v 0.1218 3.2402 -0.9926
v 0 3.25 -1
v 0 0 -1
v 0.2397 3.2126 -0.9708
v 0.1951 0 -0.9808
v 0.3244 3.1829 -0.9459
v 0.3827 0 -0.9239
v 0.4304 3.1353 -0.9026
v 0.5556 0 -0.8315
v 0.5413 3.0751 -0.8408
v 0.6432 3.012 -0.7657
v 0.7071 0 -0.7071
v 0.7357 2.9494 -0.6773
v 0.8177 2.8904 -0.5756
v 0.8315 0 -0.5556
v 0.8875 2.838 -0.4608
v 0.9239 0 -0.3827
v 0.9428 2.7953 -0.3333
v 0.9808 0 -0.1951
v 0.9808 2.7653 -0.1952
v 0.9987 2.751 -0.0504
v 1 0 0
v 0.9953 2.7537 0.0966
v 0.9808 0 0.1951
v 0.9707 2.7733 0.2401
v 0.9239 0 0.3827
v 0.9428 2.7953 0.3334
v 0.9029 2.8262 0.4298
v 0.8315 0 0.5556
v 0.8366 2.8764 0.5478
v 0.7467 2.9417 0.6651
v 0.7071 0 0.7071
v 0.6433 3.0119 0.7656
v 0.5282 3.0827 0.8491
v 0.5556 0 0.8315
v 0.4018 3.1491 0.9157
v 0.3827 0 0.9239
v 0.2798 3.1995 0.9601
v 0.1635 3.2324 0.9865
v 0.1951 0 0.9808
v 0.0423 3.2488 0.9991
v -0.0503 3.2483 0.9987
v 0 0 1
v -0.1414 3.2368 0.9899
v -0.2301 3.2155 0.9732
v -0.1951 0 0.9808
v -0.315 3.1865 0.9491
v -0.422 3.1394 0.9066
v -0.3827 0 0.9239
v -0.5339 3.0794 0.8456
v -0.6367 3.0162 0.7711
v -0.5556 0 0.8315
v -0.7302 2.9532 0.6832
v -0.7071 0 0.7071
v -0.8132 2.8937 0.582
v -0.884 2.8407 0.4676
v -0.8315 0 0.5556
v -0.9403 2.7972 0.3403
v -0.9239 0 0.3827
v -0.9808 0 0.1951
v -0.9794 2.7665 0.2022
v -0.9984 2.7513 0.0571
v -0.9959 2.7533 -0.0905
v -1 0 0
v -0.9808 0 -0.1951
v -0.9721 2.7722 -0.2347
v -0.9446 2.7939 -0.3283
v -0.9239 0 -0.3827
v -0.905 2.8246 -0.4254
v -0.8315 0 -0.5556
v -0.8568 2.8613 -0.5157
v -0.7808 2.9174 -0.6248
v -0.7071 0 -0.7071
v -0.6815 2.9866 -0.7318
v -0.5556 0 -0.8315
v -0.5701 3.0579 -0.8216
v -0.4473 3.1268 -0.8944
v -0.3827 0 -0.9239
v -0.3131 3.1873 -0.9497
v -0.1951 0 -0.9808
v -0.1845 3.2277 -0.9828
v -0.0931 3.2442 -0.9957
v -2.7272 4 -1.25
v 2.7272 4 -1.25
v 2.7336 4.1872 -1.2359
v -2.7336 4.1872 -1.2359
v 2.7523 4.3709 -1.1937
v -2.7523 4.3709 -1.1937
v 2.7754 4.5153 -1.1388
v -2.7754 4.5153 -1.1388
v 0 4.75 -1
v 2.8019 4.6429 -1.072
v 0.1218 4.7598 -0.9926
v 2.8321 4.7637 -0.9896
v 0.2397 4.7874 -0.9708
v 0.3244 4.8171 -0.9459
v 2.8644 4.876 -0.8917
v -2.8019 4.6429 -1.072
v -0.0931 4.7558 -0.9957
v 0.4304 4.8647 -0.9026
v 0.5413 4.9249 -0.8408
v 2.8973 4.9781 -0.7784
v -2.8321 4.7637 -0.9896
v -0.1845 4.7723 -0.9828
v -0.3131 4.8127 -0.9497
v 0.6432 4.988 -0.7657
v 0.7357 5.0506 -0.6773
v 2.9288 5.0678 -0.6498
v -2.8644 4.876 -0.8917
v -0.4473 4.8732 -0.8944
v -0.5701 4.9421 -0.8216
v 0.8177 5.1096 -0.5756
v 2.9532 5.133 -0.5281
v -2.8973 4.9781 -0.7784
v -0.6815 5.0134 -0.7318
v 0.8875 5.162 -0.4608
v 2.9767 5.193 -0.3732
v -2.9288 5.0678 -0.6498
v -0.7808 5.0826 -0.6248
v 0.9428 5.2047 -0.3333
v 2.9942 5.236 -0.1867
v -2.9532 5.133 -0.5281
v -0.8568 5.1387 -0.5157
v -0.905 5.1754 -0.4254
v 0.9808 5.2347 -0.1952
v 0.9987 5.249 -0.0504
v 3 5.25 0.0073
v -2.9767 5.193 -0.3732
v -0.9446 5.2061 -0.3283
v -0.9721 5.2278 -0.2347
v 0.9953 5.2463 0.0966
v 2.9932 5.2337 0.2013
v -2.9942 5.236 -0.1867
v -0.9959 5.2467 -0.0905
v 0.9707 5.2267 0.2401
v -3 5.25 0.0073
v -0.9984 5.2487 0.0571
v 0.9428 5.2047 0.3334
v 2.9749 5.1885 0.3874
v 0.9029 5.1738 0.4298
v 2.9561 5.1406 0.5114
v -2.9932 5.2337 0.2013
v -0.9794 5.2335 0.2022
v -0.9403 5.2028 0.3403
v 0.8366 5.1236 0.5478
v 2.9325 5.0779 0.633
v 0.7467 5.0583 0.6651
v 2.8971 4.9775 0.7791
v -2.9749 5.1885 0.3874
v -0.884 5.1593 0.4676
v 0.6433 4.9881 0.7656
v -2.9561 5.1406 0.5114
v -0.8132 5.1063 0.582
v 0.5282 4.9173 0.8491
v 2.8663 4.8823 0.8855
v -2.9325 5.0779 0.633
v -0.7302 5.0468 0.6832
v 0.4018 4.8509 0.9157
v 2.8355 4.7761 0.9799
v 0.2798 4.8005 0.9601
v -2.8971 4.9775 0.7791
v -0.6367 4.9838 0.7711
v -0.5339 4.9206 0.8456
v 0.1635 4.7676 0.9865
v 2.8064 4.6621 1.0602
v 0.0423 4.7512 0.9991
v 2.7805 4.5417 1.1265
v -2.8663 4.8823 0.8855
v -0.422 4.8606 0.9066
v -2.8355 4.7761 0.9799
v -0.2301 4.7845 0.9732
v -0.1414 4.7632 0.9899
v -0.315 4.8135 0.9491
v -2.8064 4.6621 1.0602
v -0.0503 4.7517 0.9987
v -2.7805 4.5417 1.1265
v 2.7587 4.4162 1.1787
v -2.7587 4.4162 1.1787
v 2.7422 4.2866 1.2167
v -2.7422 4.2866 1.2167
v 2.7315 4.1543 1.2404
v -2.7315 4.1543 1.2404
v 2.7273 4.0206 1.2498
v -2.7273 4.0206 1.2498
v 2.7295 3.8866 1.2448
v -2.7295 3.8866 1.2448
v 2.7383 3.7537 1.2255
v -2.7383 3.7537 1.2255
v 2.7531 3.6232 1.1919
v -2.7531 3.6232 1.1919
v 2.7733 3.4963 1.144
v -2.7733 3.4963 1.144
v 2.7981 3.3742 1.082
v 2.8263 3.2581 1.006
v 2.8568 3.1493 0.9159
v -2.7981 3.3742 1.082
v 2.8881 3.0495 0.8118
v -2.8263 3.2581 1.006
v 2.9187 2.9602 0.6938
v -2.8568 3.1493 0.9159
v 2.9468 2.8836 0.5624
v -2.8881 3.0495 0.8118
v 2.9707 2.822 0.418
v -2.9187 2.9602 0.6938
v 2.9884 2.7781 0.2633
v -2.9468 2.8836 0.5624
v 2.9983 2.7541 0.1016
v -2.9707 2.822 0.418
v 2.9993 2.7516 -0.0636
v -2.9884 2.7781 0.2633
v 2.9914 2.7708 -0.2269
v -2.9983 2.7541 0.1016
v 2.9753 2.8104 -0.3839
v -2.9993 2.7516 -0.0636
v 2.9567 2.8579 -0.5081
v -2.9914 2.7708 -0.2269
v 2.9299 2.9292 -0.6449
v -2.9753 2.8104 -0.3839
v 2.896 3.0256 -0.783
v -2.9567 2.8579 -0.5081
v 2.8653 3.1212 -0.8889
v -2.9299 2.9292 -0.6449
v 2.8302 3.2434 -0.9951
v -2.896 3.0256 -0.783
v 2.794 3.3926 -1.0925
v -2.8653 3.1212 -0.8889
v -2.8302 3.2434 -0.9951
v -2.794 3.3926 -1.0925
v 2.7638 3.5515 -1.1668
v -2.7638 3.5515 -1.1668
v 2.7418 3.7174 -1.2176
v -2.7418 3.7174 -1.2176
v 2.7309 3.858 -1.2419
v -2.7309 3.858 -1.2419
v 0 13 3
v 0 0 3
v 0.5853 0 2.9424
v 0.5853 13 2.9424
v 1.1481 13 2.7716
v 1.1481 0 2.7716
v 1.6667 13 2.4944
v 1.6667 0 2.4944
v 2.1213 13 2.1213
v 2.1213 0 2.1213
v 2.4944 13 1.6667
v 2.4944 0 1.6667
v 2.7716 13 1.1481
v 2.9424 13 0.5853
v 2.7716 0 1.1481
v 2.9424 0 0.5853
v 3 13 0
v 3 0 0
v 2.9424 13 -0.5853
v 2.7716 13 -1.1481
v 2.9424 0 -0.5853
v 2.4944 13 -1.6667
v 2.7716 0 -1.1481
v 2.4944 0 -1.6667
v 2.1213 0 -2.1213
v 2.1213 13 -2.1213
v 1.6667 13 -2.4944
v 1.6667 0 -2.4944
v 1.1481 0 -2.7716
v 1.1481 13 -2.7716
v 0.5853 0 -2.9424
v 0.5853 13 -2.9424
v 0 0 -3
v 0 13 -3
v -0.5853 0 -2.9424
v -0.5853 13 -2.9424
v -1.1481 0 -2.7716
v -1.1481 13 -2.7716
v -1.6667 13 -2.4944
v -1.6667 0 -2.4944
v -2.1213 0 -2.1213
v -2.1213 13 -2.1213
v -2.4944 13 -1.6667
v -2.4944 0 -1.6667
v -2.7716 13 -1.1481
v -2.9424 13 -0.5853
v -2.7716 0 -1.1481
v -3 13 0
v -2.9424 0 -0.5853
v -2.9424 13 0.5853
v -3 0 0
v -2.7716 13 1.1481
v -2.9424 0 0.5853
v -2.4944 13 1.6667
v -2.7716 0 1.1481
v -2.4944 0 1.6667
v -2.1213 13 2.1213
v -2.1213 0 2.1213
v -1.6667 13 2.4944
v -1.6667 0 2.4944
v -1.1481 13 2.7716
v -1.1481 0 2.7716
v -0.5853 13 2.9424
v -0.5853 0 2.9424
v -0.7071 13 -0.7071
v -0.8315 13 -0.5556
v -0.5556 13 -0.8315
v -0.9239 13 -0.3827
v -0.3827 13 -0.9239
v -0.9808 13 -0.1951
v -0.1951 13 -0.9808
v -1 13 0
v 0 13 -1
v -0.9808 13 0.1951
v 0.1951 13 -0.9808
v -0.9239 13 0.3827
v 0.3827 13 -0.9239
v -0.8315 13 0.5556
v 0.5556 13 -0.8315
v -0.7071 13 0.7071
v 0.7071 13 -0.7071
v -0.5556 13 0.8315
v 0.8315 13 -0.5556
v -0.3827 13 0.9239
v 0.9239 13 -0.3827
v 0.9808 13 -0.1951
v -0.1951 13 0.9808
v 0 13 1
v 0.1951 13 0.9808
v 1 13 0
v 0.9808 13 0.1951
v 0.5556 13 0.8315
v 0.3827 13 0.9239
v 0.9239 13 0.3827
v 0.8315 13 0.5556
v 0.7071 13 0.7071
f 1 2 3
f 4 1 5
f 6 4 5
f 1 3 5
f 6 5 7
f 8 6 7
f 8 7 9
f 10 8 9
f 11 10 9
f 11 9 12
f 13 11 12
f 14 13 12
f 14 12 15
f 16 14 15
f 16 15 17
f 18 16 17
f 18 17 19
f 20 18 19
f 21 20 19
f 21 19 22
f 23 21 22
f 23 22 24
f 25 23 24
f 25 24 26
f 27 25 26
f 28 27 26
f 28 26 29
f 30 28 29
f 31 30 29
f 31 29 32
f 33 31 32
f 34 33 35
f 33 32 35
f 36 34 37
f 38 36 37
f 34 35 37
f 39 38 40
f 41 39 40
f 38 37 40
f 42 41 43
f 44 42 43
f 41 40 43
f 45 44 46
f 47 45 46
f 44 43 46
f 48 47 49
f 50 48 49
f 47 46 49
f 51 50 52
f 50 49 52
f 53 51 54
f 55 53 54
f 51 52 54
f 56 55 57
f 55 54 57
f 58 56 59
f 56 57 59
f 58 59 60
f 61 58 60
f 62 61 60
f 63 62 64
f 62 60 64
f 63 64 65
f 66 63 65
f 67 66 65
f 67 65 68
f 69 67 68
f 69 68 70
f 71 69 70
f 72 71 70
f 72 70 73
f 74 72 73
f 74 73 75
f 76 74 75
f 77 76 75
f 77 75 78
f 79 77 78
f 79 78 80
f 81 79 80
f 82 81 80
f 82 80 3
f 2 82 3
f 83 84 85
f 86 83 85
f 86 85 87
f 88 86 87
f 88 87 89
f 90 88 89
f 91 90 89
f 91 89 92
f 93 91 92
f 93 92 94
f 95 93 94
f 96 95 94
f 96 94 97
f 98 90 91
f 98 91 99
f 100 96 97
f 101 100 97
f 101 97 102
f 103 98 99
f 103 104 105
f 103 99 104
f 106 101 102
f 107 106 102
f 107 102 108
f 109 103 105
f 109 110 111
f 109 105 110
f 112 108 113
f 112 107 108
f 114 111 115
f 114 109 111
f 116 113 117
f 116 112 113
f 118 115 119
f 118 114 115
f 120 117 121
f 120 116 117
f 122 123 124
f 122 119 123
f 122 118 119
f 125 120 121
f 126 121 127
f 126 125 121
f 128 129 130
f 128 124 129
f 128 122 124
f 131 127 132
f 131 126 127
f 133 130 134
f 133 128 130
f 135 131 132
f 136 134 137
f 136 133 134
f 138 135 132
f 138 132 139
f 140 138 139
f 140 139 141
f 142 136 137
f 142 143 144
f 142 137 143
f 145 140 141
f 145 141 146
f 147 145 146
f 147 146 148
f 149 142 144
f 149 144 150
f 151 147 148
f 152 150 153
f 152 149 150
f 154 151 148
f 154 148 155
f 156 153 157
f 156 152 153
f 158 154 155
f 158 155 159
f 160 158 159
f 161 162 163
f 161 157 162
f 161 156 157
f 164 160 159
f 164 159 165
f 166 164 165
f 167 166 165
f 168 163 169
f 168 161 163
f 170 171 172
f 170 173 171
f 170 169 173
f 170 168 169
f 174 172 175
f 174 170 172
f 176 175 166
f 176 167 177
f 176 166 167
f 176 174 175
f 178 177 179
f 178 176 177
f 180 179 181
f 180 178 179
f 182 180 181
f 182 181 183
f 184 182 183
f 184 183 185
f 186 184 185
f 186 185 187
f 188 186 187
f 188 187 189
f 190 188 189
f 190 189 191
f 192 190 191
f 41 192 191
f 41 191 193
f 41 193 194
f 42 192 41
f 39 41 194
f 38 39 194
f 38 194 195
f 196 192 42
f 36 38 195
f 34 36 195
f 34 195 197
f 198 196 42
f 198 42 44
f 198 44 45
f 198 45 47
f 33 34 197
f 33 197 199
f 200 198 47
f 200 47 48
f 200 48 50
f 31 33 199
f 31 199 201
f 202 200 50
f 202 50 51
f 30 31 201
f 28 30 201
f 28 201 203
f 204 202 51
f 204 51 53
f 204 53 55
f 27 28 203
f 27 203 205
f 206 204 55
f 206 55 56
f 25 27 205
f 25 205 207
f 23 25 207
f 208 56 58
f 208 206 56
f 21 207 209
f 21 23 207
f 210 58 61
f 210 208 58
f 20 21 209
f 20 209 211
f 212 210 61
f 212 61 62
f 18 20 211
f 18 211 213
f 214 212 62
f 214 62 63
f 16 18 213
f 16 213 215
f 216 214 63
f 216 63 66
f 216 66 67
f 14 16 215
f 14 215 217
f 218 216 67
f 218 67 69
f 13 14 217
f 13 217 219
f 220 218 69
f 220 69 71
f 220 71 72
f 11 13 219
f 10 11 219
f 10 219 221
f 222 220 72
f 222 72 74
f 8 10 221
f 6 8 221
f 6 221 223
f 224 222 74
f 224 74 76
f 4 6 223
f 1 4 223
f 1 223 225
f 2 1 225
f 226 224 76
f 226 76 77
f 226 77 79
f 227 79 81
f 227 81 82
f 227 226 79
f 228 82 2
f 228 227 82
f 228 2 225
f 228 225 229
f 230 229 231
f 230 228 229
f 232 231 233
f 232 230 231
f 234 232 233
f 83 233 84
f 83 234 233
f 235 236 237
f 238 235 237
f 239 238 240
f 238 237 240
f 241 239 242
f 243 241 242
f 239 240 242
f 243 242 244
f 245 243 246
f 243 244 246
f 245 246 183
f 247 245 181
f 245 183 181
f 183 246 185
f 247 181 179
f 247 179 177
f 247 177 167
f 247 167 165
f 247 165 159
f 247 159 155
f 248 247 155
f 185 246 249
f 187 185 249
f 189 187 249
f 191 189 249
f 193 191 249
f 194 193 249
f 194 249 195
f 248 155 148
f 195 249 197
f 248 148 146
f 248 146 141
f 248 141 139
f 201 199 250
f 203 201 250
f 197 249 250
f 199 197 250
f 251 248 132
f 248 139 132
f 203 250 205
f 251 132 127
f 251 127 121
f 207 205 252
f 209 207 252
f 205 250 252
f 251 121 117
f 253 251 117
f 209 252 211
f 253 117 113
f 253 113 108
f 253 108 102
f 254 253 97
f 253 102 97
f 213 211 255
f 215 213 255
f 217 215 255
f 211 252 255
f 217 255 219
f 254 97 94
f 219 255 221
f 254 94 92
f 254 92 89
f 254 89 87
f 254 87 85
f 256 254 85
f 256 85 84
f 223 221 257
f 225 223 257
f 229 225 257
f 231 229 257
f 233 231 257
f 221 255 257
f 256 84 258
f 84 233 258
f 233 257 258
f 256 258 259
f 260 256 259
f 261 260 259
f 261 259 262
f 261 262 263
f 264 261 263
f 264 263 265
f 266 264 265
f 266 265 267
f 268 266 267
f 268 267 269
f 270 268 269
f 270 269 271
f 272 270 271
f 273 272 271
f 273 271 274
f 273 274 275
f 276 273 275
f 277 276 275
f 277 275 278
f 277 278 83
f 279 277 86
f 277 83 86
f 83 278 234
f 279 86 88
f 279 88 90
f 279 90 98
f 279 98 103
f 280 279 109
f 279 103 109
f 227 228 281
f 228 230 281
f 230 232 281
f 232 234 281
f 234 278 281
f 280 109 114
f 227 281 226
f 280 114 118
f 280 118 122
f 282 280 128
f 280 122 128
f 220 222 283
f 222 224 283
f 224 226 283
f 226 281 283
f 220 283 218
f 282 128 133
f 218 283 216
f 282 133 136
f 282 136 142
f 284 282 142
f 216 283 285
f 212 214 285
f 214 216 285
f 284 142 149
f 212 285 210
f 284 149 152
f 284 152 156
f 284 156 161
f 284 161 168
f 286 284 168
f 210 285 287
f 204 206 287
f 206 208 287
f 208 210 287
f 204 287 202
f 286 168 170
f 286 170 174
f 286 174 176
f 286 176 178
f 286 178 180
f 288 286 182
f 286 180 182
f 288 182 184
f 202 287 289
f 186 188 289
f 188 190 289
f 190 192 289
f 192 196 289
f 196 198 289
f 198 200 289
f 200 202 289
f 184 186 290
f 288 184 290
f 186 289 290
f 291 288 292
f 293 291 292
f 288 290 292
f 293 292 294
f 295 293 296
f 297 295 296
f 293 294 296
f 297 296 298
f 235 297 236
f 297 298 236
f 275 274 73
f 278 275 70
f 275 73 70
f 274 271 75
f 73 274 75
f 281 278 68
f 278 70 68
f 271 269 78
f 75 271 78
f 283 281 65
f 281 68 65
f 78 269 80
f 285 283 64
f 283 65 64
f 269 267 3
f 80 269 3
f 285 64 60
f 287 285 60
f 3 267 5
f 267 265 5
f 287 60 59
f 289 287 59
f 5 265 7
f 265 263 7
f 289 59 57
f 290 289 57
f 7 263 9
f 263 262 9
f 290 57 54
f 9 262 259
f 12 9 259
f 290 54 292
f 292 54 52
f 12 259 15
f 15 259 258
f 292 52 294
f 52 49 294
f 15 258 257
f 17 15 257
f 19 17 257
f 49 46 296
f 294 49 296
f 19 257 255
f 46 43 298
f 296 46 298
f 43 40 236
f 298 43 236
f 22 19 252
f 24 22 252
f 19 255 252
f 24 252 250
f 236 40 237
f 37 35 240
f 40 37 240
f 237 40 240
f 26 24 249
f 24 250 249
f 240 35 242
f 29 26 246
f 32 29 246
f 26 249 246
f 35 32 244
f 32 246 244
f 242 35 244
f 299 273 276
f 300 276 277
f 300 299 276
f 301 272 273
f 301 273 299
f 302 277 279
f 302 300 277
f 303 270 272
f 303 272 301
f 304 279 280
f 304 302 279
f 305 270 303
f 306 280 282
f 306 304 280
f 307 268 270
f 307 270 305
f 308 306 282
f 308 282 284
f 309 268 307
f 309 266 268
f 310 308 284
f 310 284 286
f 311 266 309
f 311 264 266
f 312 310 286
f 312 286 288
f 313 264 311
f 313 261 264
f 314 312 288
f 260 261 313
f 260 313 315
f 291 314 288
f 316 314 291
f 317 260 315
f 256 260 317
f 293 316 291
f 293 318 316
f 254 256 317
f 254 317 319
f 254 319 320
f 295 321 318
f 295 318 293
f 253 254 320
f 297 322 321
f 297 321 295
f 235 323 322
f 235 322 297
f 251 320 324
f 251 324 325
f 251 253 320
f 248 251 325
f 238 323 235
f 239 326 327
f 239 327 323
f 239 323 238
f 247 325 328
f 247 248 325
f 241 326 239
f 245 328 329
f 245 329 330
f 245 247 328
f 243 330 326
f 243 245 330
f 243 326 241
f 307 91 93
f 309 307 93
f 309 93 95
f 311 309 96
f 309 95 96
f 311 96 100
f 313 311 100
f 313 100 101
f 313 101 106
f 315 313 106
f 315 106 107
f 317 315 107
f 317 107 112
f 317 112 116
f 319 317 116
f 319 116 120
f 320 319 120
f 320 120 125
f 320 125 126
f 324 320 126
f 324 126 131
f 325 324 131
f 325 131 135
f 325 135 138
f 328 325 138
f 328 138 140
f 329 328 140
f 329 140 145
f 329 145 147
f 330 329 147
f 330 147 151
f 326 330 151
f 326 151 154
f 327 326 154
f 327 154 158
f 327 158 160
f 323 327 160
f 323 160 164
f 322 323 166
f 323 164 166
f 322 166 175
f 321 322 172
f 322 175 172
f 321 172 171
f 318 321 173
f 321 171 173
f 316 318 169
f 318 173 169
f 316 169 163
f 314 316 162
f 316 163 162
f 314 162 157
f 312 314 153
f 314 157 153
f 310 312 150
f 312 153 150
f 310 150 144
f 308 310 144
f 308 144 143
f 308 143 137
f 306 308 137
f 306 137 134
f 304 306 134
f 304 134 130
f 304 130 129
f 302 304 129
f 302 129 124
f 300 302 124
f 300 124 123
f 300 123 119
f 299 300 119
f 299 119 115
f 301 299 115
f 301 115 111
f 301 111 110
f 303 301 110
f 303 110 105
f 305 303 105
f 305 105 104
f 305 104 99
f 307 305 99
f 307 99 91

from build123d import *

# Parameters (mm, degrees)
ESQUISSE1_R                  = 3
BOSS_EXTRU_1_DEPTH           = 13
ESQUISSE2_R                  = 1
ENL_V_MAT_EXTRU_1_DEPTH      = 14.674794331
ENL_V_MAT_EXTRU_3_DEPTH      = 14.674794331
ENL_V_MAT_EXTRU_3_DEPTH_BACK = 14.674794331
ESQUISSE4_R                  = 1.25


with BuildPart() as part:
    # Esquisse1 → Boss.-Extru.1 (new body)
    with BuildSketch(Plane(origin=(0, 0, 0), x_dir=(1, 0, 0), z_dir=(0, 1, 0))):
        with Locations(Location((0, 0, 0), (0, 0, 270))):
            Circle(ESQUISSE1_R)
    extrude(amount=BOSS_EXTRU_1_DEPTH)

    # Esquisse2 → Enlèv. mat.-Extru.1 (cut, through all)
    with BuildSketch(Plane.XZ):
        with Locations(Location((0, 0, 0), (0, 0, 270))):
            Circle(ESQUISSE2_R)
    extrude(amount=-ENL_V_MAT_EXTRU_1_DEPTH, mode=Mode.SUBTRACT)

    # Esquisse4 → Enlèv. mat.-Extru.3 (cut, two sides: drawn at the far end of the back side and taken through both)
    with BuildSketch(Plane(origin=(0, 0, 0), x_dir=(0, 0, -1), z_dir=(1, 0, 0)).offset(-ENL_V_MAT_EXTRU_3_DEPTH_BACK)):
        with Locations((0, 4)):
            Circle(ESQUISSE4_R)
    extrude(amount=ENL_V_MAT_EXTRU_3_DEPTH + ENL_V_MAT_EXTRU_3_DEPTH_BACK, mode=Mode.SUBTRACT)


solid = part.part
